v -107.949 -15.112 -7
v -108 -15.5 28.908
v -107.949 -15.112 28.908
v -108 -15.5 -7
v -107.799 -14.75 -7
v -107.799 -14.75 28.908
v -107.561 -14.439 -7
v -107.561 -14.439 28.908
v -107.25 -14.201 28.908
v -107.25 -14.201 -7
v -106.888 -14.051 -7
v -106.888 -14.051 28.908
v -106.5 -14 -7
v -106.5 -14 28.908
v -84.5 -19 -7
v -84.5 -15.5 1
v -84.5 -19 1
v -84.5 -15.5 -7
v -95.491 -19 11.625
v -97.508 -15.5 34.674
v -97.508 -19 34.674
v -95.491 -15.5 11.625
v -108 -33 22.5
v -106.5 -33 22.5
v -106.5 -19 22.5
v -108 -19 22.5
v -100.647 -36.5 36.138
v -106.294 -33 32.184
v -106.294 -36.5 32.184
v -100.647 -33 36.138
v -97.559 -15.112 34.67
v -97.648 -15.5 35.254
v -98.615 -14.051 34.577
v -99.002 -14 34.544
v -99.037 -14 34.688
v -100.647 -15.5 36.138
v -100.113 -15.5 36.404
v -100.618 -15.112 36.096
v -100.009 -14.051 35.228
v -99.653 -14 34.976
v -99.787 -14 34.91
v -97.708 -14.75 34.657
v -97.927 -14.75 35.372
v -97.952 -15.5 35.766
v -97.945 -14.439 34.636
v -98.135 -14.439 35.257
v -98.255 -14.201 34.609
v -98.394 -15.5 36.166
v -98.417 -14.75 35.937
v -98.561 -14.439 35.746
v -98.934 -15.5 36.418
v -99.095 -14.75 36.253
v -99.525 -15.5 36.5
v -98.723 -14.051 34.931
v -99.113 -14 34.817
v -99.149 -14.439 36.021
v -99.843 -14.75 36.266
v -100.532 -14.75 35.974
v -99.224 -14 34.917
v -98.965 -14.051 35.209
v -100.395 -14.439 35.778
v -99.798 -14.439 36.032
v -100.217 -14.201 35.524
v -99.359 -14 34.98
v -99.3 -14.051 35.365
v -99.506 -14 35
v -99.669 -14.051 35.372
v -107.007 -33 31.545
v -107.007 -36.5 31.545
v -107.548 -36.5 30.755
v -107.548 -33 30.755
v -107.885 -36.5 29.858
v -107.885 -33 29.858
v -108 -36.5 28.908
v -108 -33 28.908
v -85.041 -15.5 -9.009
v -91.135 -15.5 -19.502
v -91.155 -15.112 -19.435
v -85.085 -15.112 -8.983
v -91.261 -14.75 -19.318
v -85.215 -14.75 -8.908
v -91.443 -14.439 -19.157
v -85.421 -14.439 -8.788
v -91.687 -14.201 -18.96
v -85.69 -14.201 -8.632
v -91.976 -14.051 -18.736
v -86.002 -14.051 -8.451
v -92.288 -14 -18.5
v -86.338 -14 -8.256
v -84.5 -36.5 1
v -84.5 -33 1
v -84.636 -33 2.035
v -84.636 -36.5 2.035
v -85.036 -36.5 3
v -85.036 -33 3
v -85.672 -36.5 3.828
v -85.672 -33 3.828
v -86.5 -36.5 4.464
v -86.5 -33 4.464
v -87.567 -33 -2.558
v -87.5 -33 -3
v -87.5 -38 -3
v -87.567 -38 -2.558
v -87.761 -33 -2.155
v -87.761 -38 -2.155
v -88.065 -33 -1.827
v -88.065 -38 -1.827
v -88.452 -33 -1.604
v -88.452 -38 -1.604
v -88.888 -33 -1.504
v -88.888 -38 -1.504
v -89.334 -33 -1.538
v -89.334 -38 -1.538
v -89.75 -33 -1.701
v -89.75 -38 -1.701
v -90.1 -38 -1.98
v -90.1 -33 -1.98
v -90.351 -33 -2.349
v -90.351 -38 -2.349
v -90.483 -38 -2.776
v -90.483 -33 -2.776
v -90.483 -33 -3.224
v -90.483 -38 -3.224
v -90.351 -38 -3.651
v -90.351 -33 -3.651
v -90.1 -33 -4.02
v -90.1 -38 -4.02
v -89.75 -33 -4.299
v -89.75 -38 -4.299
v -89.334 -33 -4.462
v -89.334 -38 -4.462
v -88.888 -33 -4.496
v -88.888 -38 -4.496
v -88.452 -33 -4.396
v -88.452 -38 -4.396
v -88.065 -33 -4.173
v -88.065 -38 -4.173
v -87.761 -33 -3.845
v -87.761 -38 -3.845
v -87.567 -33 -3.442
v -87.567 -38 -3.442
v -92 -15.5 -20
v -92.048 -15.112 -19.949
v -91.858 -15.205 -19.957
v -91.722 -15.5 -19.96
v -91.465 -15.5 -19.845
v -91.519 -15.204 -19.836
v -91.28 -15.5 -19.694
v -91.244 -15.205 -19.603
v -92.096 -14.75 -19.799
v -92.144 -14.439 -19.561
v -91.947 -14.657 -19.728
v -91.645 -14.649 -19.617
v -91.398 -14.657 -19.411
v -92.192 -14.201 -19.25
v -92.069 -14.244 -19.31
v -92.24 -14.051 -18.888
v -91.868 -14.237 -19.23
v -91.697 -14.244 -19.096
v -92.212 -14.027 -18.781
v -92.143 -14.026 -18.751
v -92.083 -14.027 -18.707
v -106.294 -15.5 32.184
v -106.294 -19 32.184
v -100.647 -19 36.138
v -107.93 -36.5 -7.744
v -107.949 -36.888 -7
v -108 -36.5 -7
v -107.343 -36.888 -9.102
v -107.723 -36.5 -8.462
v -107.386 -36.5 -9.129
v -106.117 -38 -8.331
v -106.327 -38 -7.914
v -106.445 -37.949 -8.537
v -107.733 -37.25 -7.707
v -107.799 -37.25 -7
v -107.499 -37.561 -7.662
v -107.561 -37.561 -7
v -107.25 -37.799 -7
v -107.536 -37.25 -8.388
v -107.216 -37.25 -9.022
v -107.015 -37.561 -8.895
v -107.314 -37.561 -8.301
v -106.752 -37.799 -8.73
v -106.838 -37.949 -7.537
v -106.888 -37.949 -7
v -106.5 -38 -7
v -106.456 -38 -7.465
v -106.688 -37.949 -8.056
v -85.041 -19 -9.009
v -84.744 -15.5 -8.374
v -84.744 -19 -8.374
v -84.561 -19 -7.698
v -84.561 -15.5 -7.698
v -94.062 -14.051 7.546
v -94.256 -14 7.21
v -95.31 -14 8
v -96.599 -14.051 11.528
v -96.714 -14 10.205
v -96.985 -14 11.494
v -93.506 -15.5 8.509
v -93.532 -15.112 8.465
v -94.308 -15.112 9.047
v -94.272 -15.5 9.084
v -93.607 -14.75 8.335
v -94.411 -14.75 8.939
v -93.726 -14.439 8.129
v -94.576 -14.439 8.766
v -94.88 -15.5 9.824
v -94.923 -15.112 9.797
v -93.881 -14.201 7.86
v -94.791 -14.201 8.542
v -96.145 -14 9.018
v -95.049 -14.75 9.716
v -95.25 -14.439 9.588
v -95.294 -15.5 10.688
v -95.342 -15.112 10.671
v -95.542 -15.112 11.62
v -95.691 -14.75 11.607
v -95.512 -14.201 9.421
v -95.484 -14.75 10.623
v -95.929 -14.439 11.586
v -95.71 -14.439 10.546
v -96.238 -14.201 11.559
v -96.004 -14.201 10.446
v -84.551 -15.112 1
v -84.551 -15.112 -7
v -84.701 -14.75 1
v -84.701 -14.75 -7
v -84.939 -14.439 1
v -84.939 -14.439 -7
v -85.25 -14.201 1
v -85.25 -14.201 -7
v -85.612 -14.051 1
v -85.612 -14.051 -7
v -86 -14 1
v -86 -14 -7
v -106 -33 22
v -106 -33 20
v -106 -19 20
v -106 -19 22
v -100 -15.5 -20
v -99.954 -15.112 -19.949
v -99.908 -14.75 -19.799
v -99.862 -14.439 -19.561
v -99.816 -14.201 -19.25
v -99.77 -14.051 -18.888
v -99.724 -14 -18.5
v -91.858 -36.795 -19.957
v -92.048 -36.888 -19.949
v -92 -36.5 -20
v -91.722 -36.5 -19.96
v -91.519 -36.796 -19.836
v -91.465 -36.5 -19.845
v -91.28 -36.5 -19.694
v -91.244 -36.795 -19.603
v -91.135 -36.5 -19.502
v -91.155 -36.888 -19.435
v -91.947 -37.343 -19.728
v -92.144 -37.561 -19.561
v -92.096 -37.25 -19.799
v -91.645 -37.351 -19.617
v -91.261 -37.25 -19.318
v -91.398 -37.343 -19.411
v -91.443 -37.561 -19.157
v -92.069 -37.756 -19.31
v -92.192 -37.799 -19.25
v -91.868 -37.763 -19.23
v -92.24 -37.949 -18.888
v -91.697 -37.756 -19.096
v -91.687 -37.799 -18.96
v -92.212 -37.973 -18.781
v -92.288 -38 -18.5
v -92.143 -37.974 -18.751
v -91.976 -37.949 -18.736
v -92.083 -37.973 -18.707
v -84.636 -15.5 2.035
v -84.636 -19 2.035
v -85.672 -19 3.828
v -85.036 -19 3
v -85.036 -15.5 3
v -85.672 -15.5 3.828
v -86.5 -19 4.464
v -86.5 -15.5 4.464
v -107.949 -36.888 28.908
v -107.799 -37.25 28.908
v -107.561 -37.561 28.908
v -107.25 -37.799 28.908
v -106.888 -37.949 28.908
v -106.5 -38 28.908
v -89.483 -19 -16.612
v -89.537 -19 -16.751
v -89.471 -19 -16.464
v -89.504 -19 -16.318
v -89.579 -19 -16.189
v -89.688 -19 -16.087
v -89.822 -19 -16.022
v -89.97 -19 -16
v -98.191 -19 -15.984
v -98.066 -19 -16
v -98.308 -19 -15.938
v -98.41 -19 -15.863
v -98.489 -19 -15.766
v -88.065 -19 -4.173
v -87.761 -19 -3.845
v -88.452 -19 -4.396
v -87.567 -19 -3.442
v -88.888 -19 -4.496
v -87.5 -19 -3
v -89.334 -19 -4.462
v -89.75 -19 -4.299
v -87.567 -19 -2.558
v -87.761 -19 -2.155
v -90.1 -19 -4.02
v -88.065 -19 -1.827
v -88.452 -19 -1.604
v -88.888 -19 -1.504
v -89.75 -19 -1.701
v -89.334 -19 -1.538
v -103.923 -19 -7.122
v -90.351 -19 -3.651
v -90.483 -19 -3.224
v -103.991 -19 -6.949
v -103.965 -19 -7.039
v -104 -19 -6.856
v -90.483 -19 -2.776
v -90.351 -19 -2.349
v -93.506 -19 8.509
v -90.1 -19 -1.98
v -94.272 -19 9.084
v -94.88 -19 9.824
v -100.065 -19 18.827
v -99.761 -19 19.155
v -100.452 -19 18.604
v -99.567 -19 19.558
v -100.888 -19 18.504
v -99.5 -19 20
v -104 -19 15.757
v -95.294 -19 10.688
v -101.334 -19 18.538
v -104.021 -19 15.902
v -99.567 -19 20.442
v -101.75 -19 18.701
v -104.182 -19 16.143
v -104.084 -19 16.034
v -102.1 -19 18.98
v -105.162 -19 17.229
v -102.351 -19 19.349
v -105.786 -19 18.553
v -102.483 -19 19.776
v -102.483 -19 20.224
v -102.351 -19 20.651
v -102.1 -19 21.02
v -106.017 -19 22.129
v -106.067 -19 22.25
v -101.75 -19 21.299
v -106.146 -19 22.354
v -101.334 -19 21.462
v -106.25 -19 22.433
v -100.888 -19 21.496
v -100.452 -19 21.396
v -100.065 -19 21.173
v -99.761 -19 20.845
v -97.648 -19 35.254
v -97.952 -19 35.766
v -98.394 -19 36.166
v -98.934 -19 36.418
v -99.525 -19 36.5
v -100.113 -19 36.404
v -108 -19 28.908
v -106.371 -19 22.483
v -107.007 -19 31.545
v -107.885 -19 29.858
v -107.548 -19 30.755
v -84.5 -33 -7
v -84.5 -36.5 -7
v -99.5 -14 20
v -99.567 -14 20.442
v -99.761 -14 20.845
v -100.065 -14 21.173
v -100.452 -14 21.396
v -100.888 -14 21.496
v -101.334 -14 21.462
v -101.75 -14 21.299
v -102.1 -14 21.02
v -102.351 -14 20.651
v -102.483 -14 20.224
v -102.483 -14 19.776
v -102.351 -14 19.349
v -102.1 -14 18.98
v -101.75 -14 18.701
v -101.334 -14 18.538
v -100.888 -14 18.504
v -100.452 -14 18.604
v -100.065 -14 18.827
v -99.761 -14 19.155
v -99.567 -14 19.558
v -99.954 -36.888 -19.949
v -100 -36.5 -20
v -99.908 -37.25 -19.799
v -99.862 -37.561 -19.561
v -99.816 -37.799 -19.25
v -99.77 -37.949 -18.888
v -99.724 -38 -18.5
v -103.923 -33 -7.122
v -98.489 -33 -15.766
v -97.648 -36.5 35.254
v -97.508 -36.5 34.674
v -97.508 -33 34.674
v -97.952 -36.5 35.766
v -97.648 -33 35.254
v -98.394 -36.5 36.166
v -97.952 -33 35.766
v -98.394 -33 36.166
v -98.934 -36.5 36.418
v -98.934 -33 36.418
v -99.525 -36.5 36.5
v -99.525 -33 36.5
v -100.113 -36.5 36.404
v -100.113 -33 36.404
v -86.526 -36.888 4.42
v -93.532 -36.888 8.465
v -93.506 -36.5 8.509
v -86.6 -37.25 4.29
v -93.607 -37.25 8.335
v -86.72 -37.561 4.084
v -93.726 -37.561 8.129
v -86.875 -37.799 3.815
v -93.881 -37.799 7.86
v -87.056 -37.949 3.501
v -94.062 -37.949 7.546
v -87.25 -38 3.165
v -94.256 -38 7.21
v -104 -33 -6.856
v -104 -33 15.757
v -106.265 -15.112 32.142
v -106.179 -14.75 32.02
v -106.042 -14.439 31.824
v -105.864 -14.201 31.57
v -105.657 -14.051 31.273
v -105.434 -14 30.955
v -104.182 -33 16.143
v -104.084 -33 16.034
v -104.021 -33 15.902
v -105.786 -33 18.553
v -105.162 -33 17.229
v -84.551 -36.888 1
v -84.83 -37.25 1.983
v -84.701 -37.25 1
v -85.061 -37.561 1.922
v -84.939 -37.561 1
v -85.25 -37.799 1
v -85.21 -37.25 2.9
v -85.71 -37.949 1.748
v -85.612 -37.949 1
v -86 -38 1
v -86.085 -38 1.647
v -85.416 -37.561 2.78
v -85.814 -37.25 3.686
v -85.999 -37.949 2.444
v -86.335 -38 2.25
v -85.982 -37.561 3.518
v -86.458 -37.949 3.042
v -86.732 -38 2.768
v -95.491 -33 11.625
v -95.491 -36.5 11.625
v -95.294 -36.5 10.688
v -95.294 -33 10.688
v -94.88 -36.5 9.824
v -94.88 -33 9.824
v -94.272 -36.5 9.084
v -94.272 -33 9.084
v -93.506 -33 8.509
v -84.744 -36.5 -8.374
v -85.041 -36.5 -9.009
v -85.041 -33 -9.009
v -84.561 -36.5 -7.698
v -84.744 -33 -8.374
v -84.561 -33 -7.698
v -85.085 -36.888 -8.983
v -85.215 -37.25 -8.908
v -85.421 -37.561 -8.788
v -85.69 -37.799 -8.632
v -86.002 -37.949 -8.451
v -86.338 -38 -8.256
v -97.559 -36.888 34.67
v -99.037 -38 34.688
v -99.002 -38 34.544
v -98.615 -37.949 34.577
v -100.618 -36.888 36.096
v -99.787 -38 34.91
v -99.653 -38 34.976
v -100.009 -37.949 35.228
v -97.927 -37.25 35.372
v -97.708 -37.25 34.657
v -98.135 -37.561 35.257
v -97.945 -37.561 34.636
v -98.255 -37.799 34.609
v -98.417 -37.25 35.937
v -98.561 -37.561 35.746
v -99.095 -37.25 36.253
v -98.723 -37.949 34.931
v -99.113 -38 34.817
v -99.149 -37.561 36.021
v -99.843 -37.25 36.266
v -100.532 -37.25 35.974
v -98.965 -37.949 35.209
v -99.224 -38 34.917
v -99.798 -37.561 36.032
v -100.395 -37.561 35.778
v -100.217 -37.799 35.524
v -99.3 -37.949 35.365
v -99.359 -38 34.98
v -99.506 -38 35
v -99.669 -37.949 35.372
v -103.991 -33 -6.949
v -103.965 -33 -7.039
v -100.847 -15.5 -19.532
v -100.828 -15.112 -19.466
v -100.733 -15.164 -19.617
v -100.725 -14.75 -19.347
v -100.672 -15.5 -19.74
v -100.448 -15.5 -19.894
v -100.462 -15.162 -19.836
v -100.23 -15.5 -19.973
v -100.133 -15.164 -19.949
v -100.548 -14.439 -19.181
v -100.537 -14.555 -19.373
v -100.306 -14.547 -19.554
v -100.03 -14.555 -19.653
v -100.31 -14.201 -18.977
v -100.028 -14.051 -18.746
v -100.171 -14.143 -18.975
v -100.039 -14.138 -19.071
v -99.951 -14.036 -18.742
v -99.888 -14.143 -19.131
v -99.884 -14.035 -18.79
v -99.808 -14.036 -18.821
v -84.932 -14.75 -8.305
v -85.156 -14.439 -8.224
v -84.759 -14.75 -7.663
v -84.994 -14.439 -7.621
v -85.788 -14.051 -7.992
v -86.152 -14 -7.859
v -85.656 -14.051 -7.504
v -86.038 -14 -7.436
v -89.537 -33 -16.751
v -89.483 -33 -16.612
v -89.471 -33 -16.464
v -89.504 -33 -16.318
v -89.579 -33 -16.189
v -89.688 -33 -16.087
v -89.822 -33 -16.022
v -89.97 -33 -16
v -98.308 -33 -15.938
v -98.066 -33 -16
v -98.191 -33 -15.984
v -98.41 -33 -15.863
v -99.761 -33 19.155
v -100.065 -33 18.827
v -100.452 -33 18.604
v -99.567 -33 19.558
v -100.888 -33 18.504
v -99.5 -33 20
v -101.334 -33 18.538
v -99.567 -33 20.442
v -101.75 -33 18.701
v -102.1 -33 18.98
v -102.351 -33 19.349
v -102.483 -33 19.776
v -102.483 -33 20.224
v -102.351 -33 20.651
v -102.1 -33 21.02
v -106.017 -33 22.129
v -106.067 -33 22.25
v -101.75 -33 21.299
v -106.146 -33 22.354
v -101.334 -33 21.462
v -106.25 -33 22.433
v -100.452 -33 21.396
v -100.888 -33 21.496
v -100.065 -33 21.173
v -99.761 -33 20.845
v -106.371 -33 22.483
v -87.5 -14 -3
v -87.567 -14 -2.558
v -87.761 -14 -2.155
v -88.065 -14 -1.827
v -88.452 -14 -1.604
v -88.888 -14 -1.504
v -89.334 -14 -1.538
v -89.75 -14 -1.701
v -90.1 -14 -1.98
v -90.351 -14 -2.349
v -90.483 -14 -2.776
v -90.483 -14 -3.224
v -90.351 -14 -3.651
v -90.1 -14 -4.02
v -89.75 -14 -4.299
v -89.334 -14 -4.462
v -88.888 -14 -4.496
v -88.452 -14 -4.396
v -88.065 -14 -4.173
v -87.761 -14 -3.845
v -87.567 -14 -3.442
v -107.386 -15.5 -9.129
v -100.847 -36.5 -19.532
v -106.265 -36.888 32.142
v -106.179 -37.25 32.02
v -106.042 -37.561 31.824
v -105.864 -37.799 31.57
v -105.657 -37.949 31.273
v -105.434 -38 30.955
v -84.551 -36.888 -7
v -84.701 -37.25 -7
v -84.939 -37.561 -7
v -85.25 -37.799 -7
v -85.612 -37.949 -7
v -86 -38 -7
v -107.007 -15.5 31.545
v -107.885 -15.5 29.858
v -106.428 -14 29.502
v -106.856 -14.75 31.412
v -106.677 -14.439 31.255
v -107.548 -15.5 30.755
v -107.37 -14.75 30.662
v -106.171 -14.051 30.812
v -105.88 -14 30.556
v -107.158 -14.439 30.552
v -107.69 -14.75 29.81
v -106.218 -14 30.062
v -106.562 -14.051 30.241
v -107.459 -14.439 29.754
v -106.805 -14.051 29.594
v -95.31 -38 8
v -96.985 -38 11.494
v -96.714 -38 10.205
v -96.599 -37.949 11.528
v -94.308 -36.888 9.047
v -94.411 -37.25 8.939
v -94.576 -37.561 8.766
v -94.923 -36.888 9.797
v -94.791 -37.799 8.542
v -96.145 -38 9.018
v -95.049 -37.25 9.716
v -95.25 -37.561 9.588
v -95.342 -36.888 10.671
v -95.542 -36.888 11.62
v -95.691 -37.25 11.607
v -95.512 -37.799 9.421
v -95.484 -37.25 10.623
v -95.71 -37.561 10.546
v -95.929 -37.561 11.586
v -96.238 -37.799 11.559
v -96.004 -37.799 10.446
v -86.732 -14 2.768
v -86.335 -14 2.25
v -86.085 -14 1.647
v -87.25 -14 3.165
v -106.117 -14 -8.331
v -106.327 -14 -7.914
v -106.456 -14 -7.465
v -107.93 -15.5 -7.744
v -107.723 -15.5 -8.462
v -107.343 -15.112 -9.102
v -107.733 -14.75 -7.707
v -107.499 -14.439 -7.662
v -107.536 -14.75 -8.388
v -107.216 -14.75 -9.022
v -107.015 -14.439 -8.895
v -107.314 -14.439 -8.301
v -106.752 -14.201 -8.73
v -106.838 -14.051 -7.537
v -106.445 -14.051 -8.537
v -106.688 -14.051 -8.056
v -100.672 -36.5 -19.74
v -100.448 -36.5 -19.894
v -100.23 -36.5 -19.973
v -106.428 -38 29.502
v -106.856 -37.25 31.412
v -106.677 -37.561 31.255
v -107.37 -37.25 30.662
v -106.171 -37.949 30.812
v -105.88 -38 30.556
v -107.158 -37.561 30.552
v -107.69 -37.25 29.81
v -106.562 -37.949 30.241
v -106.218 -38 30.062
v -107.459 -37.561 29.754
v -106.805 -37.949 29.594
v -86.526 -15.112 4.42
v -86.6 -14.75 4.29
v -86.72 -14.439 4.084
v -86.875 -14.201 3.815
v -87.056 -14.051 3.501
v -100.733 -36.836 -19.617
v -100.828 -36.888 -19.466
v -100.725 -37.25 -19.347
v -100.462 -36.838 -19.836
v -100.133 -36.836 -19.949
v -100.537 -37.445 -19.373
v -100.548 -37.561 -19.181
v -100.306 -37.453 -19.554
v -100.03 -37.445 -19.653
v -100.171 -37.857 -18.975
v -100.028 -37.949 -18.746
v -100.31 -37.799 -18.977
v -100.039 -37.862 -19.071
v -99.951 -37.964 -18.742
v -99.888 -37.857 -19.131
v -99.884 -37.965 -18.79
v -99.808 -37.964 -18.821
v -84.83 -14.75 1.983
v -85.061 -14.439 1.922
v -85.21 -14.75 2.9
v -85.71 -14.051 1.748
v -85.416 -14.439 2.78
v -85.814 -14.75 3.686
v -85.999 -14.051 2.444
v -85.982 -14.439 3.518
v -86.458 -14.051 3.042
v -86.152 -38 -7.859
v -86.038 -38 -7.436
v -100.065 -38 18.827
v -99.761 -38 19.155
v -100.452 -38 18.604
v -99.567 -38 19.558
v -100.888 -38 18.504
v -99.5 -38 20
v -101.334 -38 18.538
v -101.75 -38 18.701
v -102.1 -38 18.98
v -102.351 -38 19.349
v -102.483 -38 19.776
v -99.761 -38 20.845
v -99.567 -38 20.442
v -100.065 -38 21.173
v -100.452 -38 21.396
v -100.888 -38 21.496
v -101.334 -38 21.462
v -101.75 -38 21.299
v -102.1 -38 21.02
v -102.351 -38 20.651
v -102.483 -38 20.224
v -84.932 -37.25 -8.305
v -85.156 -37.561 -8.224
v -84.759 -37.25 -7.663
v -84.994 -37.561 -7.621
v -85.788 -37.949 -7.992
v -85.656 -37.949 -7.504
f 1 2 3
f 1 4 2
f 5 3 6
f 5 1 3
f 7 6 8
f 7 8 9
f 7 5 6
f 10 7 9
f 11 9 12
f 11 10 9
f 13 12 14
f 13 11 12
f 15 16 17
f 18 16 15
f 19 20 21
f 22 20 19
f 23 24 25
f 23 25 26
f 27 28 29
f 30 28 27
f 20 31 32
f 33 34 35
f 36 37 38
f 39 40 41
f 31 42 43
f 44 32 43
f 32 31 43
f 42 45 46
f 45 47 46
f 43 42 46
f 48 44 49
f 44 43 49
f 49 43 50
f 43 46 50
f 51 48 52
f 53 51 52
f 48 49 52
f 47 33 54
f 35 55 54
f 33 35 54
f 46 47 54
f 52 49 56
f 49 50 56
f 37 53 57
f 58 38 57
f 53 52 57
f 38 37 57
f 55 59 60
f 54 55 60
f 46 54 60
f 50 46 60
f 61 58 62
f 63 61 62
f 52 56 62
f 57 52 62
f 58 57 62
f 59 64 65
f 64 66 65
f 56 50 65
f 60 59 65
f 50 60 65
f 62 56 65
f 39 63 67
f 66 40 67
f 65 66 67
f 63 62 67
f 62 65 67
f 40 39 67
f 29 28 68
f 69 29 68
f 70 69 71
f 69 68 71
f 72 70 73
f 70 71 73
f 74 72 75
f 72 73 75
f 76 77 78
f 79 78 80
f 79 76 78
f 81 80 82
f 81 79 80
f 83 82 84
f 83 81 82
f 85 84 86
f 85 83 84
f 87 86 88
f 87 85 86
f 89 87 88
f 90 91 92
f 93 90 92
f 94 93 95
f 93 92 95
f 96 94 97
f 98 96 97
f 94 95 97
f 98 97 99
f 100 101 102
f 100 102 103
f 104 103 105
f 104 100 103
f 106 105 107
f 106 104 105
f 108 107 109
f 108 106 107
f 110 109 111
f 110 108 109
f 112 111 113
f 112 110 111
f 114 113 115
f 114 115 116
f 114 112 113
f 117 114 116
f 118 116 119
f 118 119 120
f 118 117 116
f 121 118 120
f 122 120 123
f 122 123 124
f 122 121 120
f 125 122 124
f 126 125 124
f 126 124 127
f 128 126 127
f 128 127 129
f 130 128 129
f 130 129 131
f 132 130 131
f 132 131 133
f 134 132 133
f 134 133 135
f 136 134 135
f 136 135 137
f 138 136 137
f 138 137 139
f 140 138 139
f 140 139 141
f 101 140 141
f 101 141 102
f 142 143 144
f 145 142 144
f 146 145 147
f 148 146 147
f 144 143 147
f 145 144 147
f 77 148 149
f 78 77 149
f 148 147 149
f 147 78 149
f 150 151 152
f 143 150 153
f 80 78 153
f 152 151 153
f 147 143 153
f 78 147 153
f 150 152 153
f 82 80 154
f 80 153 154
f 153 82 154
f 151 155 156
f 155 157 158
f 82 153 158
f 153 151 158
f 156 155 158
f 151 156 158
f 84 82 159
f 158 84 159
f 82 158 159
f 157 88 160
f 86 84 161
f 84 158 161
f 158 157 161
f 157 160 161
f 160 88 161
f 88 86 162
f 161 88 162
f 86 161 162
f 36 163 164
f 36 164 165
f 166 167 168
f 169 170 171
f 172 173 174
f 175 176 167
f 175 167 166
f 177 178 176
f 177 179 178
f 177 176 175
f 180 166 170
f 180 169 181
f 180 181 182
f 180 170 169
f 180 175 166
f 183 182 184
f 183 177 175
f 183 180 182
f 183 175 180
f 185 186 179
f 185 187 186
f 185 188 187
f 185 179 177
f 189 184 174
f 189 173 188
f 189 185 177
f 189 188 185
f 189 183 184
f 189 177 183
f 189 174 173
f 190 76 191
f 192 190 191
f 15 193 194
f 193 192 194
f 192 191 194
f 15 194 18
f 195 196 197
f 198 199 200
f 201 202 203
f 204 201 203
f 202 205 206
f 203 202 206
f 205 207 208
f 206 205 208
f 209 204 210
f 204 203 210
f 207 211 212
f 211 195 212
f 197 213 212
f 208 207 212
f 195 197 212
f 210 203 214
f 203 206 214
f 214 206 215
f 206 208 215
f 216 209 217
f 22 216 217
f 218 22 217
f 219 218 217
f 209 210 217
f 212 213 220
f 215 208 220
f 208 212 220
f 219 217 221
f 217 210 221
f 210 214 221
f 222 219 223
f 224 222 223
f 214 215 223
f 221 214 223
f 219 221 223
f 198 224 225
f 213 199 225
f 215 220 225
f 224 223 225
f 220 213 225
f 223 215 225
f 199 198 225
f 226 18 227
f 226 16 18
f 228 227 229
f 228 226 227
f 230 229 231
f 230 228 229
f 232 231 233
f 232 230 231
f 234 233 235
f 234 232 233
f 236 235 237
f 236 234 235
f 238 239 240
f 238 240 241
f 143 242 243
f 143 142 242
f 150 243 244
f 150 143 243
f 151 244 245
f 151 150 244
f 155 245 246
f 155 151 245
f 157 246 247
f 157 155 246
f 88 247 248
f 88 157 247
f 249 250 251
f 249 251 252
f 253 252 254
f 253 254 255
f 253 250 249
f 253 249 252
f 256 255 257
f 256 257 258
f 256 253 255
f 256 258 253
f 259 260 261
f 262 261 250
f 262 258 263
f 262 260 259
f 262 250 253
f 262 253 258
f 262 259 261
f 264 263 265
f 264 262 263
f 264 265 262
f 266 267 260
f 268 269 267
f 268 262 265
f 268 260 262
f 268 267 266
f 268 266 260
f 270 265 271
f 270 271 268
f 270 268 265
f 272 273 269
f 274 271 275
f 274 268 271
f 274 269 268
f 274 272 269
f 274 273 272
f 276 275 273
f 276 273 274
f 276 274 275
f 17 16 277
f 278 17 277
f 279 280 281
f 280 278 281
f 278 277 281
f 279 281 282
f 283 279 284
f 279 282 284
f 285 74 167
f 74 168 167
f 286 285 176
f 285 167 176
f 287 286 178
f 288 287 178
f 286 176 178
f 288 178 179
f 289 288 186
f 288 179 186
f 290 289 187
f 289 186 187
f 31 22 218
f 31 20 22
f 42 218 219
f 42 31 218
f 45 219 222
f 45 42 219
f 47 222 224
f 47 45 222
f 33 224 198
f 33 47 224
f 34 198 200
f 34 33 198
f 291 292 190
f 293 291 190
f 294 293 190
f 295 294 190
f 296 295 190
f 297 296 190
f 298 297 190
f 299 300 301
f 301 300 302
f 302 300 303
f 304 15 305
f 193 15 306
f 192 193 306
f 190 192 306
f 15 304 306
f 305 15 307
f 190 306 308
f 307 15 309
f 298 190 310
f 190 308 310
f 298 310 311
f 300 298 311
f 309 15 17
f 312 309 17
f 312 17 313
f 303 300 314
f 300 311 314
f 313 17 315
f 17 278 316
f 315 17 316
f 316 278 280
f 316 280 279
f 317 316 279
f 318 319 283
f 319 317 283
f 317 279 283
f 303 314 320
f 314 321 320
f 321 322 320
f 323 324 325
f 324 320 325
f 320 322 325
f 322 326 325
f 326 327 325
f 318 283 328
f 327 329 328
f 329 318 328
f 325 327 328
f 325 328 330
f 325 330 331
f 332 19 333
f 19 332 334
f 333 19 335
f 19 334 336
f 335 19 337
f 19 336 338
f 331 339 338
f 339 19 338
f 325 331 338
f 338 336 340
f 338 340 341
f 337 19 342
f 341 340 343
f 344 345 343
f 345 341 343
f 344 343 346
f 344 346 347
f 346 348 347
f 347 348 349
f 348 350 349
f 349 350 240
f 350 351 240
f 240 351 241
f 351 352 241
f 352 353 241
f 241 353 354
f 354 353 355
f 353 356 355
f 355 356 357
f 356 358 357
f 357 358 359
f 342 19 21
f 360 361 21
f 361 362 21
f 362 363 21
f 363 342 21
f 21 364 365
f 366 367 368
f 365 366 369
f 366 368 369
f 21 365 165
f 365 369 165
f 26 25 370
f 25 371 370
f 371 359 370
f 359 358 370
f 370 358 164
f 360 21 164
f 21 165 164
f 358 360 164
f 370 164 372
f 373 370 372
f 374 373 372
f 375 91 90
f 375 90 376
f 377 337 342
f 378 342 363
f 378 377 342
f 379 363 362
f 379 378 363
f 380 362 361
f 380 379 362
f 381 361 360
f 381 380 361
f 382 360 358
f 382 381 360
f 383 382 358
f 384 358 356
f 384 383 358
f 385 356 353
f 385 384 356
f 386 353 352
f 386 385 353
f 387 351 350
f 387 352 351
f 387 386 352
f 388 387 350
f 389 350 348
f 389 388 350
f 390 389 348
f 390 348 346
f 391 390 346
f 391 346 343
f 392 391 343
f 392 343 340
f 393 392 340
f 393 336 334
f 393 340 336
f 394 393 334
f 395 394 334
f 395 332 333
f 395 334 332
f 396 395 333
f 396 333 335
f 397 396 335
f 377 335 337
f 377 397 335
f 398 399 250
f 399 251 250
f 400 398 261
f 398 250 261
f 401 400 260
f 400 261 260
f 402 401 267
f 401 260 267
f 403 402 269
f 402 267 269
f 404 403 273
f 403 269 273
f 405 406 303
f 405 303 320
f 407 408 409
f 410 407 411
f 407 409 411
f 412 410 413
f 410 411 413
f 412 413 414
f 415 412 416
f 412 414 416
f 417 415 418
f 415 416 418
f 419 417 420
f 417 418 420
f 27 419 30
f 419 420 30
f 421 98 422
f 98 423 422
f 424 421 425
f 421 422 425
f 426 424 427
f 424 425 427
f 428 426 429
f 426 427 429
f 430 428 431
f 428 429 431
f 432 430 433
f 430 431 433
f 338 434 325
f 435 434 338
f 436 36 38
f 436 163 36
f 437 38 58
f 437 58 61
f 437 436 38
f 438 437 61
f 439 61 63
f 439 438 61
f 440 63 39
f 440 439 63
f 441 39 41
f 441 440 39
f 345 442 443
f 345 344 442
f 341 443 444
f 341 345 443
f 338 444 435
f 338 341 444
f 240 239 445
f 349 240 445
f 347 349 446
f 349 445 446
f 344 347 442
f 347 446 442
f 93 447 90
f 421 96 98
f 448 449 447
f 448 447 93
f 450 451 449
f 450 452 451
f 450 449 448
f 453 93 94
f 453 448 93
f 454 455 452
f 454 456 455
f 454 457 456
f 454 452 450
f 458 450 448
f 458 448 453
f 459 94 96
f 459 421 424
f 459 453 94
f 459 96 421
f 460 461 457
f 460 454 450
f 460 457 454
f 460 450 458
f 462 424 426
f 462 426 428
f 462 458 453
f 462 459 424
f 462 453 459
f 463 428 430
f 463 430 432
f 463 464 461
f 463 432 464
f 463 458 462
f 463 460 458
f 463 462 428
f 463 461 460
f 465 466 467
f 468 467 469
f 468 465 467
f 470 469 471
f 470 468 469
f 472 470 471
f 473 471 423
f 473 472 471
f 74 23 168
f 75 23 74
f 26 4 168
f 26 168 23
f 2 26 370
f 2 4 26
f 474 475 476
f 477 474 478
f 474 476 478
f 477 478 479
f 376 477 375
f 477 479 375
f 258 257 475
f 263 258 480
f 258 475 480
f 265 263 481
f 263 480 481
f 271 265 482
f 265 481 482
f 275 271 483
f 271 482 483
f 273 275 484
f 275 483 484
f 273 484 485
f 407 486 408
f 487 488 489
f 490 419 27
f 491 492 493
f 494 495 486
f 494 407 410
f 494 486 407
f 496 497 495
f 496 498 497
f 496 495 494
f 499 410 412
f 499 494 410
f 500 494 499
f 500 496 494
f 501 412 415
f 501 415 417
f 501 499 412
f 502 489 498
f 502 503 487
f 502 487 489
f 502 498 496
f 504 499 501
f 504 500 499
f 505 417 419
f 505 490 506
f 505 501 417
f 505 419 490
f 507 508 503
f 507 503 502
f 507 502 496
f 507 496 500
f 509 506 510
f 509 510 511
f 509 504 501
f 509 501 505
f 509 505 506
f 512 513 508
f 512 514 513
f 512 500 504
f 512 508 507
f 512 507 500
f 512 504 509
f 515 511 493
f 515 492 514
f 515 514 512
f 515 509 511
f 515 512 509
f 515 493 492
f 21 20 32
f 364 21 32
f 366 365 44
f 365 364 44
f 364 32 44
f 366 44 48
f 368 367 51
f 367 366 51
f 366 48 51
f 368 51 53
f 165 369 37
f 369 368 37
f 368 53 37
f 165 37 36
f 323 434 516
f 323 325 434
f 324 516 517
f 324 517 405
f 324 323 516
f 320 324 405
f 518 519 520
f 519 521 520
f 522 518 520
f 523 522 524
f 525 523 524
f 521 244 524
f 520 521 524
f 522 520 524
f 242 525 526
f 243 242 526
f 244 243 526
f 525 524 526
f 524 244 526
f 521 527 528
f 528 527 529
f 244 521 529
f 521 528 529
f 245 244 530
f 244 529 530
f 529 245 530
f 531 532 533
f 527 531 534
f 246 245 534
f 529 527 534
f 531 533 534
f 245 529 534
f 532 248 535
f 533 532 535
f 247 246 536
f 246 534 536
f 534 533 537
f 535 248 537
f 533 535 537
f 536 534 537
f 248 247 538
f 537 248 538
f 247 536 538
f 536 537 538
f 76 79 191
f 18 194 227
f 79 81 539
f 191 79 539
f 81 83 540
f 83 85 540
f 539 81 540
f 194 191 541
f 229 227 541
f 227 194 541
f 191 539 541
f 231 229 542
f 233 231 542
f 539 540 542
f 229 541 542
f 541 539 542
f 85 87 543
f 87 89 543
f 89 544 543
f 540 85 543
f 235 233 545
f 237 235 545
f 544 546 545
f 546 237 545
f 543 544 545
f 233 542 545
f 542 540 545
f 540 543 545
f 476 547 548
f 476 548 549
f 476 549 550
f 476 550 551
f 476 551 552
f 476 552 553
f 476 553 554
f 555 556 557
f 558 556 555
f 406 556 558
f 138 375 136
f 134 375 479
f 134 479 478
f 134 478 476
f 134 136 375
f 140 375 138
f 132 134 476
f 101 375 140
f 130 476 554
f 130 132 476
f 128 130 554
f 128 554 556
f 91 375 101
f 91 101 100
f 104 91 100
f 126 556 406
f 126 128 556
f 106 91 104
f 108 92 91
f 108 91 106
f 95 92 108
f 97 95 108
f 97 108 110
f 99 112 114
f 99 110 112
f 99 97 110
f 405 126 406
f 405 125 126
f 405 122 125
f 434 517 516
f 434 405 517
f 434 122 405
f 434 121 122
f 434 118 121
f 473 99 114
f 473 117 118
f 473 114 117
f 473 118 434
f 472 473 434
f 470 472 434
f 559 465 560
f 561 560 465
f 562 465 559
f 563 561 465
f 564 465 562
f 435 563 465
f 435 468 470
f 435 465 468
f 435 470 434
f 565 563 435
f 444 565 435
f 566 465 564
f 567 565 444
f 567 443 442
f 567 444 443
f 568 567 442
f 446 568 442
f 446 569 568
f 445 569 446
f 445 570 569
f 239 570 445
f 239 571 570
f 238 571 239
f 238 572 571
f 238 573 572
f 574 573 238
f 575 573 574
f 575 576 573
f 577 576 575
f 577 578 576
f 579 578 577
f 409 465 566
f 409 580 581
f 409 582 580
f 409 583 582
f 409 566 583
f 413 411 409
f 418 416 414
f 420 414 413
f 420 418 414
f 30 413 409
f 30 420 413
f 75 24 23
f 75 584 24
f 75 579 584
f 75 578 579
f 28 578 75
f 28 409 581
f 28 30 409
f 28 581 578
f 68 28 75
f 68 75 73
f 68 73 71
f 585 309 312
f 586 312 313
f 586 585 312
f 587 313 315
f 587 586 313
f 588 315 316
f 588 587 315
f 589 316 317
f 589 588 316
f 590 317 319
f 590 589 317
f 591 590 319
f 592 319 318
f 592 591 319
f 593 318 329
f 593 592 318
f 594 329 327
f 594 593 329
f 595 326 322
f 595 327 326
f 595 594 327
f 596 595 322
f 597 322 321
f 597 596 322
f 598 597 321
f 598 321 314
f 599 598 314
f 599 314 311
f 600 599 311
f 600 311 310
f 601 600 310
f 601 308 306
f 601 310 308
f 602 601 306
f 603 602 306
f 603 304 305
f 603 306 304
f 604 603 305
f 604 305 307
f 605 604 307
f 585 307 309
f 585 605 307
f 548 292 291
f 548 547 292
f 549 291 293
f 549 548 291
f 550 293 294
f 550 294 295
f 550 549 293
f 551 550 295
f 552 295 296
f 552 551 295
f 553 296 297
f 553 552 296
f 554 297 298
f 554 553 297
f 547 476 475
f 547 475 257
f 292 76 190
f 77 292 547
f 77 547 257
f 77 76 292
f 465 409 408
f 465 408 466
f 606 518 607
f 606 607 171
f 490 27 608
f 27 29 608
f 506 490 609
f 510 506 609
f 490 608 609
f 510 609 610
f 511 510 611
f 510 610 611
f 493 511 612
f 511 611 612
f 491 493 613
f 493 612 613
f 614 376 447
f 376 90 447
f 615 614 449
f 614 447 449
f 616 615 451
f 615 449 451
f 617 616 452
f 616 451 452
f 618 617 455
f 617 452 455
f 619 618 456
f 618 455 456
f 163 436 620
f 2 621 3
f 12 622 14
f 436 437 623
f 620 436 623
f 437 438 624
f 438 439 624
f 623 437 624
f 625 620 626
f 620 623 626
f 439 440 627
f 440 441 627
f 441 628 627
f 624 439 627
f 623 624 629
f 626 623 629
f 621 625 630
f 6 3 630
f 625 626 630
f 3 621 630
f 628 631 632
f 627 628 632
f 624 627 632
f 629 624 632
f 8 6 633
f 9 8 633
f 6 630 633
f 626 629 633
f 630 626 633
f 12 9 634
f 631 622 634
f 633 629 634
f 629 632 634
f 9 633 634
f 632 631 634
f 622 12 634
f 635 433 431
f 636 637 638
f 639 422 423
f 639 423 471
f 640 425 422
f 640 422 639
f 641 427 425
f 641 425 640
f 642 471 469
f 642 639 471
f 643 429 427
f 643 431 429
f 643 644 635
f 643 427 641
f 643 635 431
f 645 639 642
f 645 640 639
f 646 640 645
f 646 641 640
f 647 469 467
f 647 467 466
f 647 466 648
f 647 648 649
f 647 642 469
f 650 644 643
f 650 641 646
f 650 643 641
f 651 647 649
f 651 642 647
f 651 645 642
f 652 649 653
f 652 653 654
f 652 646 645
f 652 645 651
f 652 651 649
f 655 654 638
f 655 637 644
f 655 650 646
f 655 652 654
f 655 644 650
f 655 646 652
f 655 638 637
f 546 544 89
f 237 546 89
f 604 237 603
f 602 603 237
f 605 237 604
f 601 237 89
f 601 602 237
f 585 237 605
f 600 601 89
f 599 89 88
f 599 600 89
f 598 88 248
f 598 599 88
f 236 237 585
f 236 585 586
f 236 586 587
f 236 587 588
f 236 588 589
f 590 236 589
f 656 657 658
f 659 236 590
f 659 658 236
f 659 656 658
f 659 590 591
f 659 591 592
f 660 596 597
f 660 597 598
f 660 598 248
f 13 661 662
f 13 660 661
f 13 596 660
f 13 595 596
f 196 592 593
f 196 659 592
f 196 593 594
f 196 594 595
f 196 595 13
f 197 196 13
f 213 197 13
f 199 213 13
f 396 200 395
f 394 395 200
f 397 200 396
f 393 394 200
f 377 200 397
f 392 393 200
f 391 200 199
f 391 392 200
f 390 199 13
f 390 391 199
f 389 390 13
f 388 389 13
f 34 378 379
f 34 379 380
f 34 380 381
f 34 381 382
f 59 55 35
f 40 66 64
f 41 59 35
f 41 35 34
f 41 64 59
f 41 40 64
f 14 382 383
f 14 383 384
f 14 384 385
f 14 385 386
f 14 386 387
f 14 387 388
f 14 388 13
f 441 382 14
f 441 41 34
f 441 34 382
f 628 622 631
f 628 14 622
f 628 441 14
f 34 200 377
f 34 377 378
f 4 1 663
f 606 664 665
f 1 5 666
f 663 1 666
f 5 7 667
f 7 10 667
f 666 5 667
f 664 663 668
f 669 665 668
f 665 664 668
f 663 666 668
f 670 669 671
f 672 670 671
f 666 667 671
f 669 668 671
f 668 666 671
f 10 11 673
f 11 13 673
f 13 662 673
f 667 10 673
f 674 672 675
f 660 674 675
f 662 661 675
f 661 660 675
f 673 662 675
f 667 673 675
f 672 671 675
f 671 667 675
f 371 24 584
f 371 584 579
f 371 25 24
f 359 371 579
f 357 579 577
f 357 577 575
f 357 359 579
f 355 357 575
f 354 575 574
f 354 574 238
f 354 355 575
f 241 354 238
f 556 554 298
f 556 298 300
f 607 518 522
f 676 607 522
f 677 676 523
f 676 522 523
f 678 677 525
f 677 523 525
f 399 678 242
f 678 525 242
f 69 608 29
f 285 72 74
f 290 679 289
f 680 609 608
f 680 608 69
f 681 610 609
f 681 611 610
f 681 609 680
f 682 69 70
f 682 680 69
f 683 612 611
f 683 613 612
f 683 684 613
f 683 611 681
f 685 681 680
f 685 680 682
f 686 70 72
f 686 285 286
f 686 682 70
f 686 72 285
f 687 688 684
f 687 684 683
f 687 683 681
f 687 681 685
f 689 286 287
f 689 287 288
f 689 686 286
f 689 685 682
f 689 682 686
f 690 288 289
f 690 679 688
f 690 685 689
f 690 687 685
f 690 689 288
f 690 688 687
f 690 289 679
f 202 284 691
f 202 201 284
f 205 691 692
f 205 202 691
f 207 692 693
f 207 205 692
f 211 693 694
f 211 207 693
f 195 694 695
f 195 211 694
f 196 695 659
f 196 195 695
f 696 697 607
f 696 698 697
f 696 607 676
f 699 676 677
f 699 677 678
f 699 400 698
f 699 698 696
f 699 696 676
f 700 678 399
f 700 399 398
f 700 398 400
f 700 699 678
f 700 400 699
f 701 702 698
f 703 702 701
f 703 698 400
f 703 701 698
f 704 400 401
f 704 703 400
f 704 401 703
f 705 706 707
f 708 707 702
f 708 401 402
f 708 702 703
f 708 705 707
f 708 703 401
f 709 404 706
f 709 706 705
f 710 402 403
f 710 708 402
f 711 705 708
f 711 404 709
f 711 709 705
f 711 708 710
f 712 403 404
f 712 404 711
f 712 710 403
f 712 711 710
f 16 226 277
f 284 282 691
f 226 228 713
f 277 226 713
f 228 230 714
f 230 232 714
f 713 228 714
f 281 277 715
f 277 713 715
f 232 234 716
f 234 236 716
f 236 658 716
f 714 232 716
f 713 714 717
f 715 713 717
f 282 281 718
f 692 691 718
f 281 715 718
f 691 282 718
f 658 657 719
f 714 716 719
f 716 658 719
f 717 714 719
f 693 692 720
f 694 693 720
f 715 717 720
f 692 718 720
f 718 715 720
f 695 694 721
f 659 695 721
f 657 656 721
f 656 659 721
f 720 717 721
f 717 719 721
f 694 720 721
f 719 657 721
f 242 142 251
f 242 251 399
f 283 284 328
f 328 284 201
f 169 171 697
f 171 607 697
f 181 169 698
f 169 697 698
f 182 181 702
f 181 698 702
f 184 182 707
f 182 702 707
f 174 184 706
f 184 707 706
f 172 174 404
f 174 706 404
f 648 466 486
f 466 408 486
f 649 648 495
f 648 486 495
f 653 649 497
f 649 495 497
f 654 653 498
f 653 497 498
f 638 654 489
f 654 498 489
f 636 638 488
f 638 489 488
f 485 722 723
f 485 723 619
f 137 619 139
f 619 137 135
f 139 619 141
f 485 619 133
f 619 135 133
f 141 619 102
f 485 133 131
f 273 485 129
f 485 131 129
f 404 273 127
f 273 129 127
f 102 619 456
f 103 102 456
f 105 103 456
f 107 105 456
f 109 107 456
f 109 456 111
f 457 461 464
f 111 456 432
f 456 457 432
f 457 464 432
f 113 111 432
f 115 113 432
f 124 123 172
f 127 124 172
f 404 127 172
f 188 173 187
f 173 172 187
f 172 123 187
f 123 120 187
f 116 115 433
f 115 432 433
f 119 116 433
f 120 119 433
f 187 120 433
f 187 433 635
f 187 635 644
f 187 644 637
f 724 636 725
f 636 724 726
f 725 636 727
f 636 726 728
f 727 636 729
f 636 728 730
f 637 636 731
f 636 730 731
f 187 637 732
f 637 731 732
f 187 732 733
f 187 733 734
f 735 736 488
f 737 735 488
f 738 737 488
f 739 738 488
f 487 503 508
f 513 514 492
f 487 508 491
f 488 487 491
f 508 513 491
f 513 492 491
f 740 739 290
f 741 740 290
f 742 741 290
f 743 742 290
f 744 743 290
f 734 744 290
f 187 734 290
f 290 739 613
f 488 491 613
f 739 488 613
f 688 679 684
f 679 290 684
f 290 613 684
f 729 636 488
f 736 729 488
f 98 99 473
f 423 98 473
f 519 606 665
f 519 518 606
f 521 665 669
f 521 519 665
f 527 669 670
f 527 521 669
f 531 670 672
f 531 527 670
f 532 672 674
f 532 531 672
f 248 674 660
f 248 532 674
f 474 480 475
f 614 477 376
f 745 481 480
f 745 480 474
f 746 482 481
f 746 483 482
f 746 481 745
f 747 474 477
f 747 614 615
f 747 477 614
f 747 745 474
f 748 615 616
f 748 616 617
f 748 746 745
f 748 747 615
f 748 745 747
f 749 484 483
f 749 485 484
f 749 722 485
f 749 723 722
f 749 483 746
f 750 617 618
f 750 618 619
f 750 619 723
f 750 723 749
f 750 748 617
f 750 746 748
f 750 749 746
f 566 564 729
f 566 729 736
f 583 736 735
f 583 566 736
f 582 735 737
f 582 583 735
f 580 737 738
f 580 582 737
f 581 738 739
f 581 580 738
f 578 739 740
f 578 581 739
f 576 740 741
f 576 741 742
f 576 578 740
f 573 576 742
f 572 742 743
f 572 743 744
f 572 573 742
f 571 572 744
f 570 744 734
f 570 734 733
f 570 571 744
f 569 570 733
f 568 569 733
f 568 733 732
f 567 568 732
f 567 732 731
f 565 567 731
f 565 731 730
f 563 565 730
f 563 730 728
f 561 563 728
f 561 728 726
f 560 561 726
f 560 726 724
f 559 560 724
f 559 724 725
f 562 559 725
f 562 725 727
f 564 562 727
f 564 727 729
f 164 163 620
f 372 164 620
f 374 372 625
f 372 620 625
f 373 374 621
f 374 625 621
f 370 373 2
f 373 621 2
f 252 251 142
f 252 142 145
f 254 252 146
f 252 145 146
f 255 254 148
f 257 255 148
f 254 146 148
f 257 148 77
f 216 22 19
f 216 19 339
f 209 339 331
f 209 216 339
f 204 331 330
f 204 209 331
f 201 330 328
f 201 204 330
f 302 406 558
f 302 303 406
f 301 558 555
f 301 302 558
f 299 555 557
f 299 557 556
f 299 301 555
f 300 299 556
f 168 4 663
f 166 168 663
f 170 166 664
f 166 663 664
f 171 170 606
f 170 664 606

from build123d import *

# Parameters (mm, degrees)
SKETCH036_R     = 1.5
PAD021_DEPTH    = 24
FILLET007_R     = 1.5
POCKET013_DEPTH = 14
FILLET008_R     = 0.5


with BuildPart() as part:
    # Sketch036 → Pad021 (new body)
    with BuildSketch(Plane.XZ):
        with BuildLine():
            Line((-59.294306, 24.684125), (-53.647153, 28.638304))
            ThreePointArc((-50.507611, 27.174311), (-51.654763, 28.812616), (-53.647153, 28.638304))
            Line((-50.507611, 27.174311), (-48.491026, 4.124639))
            ThreePointArc((-48.491026, 4.124639), (-47.879813, 2.324063), (-46.506247, 1.00916))
            Line((-39.5, -3.035898), (-46.506247, 1.00916))
            ThreePointArc((-37.5, -6.5), (-38.035898, -4.5), (-39.5, -3.035898))
            Line((-37.5, -6.5), (-37.5, -14.5))
            ThreePointArc((-38.041032, -16.508866), (-37.637626, -15.540223), (-37.5, -14.5))
            Line((-38.041032, -16.508866), (-44.135258, -27.002216))
            ThreePointArc((-45, -27.5), (-44.501109, -27.366665), (-44.135258, -27.002216))
            Line((-45, -27.5), (-53, -27.5))
            ThreePointArc((-53.846615, -27.032205), (-53.483629, -27.375273), (-53, -27.5))
            Line((-53.846615, -27.032205), (-60.386462, -16.628821))
            ThreePointArc((-61, -14.5), (-60.843556, -15.607735), (-60.386462, -16.628821))
            Line((-61, -14.5), (-61, 21.407517))
            ThreePointArc((-59.294306, 24.684125), (-60.548043, 23.254511), (-61, 21.407517))
        make_face()
        with Locations((-54, 12.5)):
            Circle(SKETCH036_R, mode=Mode.SUBTRACT)
        with Locations((-42, -10.5)):
            Circle(SKETCH036_R, mode=Mode.SUBTRACT)
    extrude(amount=PAD021_DEPTH)

    # Fillet007
    fillet007_edges = [part.edges().sort_by_distance(p)[0] for p in [
        (-60.548043, 0, 23.254511),
        (-60.548043, -24, 23.254511),
    ]]
    fillet(fillet007_edges, radius=FILLET007_R)

    # Sketch037 (on Face12 of Fillet007) → Pocket013 (cut)
    with BuildSketch(Plane.XZ.offset(19)):
        with BuildLine():
            Line((-37.475618, -23.5), (-51.342359, -23.5))
            Line((-51.342359, -23.5), (-57, -14.5))
            Line((-57, -14.5), (-57, 8.5))
            ThreePointArc((-59, 12.5), (-58.472136, 10.263932), (-57, 8.5))
            Line((-59, 12.5), (-59, 15))
            Line((-59, 15), (-79, 15))
            Line((-79, 15), (-79, 35))
            Line((-79, 35), (-15.733307, 35))
            Line((-15.733307, 35), (-15.733307, -20.5))
            Line((-15.733307, -20.5), (-35.733307, -20.5))
            Line((-35.733307, -20.5), (-37.475618, -23.5))
        make_face()
    extrude(amount=-POCKET013_DEPTH, mode=Mode.SUBTRACT)

    # Fillet008
    fillet008_edges = [part.edges().sort_by_distance(p)[0] for p in [
        (-57, -12, 8.5),
        (-59, -12, 15),
        (-57, -12, -14.5),
        (-51.342359, -12, -23.5),
        (-42.101275, -12, -23.5),
    ]]
    fillet(fillet008_edges, radius=FILLET008_R)


with BuildPart() as part_1:
    # Body003 placement: moved
    add(part.part.moved(Location((0, 33, 0))))


with BuildPart() as part_2:
    # Clone170 placement: moved
    add(part_1.part.moved(Location((-47, -47, 7.5))))


solid = part_2.part
